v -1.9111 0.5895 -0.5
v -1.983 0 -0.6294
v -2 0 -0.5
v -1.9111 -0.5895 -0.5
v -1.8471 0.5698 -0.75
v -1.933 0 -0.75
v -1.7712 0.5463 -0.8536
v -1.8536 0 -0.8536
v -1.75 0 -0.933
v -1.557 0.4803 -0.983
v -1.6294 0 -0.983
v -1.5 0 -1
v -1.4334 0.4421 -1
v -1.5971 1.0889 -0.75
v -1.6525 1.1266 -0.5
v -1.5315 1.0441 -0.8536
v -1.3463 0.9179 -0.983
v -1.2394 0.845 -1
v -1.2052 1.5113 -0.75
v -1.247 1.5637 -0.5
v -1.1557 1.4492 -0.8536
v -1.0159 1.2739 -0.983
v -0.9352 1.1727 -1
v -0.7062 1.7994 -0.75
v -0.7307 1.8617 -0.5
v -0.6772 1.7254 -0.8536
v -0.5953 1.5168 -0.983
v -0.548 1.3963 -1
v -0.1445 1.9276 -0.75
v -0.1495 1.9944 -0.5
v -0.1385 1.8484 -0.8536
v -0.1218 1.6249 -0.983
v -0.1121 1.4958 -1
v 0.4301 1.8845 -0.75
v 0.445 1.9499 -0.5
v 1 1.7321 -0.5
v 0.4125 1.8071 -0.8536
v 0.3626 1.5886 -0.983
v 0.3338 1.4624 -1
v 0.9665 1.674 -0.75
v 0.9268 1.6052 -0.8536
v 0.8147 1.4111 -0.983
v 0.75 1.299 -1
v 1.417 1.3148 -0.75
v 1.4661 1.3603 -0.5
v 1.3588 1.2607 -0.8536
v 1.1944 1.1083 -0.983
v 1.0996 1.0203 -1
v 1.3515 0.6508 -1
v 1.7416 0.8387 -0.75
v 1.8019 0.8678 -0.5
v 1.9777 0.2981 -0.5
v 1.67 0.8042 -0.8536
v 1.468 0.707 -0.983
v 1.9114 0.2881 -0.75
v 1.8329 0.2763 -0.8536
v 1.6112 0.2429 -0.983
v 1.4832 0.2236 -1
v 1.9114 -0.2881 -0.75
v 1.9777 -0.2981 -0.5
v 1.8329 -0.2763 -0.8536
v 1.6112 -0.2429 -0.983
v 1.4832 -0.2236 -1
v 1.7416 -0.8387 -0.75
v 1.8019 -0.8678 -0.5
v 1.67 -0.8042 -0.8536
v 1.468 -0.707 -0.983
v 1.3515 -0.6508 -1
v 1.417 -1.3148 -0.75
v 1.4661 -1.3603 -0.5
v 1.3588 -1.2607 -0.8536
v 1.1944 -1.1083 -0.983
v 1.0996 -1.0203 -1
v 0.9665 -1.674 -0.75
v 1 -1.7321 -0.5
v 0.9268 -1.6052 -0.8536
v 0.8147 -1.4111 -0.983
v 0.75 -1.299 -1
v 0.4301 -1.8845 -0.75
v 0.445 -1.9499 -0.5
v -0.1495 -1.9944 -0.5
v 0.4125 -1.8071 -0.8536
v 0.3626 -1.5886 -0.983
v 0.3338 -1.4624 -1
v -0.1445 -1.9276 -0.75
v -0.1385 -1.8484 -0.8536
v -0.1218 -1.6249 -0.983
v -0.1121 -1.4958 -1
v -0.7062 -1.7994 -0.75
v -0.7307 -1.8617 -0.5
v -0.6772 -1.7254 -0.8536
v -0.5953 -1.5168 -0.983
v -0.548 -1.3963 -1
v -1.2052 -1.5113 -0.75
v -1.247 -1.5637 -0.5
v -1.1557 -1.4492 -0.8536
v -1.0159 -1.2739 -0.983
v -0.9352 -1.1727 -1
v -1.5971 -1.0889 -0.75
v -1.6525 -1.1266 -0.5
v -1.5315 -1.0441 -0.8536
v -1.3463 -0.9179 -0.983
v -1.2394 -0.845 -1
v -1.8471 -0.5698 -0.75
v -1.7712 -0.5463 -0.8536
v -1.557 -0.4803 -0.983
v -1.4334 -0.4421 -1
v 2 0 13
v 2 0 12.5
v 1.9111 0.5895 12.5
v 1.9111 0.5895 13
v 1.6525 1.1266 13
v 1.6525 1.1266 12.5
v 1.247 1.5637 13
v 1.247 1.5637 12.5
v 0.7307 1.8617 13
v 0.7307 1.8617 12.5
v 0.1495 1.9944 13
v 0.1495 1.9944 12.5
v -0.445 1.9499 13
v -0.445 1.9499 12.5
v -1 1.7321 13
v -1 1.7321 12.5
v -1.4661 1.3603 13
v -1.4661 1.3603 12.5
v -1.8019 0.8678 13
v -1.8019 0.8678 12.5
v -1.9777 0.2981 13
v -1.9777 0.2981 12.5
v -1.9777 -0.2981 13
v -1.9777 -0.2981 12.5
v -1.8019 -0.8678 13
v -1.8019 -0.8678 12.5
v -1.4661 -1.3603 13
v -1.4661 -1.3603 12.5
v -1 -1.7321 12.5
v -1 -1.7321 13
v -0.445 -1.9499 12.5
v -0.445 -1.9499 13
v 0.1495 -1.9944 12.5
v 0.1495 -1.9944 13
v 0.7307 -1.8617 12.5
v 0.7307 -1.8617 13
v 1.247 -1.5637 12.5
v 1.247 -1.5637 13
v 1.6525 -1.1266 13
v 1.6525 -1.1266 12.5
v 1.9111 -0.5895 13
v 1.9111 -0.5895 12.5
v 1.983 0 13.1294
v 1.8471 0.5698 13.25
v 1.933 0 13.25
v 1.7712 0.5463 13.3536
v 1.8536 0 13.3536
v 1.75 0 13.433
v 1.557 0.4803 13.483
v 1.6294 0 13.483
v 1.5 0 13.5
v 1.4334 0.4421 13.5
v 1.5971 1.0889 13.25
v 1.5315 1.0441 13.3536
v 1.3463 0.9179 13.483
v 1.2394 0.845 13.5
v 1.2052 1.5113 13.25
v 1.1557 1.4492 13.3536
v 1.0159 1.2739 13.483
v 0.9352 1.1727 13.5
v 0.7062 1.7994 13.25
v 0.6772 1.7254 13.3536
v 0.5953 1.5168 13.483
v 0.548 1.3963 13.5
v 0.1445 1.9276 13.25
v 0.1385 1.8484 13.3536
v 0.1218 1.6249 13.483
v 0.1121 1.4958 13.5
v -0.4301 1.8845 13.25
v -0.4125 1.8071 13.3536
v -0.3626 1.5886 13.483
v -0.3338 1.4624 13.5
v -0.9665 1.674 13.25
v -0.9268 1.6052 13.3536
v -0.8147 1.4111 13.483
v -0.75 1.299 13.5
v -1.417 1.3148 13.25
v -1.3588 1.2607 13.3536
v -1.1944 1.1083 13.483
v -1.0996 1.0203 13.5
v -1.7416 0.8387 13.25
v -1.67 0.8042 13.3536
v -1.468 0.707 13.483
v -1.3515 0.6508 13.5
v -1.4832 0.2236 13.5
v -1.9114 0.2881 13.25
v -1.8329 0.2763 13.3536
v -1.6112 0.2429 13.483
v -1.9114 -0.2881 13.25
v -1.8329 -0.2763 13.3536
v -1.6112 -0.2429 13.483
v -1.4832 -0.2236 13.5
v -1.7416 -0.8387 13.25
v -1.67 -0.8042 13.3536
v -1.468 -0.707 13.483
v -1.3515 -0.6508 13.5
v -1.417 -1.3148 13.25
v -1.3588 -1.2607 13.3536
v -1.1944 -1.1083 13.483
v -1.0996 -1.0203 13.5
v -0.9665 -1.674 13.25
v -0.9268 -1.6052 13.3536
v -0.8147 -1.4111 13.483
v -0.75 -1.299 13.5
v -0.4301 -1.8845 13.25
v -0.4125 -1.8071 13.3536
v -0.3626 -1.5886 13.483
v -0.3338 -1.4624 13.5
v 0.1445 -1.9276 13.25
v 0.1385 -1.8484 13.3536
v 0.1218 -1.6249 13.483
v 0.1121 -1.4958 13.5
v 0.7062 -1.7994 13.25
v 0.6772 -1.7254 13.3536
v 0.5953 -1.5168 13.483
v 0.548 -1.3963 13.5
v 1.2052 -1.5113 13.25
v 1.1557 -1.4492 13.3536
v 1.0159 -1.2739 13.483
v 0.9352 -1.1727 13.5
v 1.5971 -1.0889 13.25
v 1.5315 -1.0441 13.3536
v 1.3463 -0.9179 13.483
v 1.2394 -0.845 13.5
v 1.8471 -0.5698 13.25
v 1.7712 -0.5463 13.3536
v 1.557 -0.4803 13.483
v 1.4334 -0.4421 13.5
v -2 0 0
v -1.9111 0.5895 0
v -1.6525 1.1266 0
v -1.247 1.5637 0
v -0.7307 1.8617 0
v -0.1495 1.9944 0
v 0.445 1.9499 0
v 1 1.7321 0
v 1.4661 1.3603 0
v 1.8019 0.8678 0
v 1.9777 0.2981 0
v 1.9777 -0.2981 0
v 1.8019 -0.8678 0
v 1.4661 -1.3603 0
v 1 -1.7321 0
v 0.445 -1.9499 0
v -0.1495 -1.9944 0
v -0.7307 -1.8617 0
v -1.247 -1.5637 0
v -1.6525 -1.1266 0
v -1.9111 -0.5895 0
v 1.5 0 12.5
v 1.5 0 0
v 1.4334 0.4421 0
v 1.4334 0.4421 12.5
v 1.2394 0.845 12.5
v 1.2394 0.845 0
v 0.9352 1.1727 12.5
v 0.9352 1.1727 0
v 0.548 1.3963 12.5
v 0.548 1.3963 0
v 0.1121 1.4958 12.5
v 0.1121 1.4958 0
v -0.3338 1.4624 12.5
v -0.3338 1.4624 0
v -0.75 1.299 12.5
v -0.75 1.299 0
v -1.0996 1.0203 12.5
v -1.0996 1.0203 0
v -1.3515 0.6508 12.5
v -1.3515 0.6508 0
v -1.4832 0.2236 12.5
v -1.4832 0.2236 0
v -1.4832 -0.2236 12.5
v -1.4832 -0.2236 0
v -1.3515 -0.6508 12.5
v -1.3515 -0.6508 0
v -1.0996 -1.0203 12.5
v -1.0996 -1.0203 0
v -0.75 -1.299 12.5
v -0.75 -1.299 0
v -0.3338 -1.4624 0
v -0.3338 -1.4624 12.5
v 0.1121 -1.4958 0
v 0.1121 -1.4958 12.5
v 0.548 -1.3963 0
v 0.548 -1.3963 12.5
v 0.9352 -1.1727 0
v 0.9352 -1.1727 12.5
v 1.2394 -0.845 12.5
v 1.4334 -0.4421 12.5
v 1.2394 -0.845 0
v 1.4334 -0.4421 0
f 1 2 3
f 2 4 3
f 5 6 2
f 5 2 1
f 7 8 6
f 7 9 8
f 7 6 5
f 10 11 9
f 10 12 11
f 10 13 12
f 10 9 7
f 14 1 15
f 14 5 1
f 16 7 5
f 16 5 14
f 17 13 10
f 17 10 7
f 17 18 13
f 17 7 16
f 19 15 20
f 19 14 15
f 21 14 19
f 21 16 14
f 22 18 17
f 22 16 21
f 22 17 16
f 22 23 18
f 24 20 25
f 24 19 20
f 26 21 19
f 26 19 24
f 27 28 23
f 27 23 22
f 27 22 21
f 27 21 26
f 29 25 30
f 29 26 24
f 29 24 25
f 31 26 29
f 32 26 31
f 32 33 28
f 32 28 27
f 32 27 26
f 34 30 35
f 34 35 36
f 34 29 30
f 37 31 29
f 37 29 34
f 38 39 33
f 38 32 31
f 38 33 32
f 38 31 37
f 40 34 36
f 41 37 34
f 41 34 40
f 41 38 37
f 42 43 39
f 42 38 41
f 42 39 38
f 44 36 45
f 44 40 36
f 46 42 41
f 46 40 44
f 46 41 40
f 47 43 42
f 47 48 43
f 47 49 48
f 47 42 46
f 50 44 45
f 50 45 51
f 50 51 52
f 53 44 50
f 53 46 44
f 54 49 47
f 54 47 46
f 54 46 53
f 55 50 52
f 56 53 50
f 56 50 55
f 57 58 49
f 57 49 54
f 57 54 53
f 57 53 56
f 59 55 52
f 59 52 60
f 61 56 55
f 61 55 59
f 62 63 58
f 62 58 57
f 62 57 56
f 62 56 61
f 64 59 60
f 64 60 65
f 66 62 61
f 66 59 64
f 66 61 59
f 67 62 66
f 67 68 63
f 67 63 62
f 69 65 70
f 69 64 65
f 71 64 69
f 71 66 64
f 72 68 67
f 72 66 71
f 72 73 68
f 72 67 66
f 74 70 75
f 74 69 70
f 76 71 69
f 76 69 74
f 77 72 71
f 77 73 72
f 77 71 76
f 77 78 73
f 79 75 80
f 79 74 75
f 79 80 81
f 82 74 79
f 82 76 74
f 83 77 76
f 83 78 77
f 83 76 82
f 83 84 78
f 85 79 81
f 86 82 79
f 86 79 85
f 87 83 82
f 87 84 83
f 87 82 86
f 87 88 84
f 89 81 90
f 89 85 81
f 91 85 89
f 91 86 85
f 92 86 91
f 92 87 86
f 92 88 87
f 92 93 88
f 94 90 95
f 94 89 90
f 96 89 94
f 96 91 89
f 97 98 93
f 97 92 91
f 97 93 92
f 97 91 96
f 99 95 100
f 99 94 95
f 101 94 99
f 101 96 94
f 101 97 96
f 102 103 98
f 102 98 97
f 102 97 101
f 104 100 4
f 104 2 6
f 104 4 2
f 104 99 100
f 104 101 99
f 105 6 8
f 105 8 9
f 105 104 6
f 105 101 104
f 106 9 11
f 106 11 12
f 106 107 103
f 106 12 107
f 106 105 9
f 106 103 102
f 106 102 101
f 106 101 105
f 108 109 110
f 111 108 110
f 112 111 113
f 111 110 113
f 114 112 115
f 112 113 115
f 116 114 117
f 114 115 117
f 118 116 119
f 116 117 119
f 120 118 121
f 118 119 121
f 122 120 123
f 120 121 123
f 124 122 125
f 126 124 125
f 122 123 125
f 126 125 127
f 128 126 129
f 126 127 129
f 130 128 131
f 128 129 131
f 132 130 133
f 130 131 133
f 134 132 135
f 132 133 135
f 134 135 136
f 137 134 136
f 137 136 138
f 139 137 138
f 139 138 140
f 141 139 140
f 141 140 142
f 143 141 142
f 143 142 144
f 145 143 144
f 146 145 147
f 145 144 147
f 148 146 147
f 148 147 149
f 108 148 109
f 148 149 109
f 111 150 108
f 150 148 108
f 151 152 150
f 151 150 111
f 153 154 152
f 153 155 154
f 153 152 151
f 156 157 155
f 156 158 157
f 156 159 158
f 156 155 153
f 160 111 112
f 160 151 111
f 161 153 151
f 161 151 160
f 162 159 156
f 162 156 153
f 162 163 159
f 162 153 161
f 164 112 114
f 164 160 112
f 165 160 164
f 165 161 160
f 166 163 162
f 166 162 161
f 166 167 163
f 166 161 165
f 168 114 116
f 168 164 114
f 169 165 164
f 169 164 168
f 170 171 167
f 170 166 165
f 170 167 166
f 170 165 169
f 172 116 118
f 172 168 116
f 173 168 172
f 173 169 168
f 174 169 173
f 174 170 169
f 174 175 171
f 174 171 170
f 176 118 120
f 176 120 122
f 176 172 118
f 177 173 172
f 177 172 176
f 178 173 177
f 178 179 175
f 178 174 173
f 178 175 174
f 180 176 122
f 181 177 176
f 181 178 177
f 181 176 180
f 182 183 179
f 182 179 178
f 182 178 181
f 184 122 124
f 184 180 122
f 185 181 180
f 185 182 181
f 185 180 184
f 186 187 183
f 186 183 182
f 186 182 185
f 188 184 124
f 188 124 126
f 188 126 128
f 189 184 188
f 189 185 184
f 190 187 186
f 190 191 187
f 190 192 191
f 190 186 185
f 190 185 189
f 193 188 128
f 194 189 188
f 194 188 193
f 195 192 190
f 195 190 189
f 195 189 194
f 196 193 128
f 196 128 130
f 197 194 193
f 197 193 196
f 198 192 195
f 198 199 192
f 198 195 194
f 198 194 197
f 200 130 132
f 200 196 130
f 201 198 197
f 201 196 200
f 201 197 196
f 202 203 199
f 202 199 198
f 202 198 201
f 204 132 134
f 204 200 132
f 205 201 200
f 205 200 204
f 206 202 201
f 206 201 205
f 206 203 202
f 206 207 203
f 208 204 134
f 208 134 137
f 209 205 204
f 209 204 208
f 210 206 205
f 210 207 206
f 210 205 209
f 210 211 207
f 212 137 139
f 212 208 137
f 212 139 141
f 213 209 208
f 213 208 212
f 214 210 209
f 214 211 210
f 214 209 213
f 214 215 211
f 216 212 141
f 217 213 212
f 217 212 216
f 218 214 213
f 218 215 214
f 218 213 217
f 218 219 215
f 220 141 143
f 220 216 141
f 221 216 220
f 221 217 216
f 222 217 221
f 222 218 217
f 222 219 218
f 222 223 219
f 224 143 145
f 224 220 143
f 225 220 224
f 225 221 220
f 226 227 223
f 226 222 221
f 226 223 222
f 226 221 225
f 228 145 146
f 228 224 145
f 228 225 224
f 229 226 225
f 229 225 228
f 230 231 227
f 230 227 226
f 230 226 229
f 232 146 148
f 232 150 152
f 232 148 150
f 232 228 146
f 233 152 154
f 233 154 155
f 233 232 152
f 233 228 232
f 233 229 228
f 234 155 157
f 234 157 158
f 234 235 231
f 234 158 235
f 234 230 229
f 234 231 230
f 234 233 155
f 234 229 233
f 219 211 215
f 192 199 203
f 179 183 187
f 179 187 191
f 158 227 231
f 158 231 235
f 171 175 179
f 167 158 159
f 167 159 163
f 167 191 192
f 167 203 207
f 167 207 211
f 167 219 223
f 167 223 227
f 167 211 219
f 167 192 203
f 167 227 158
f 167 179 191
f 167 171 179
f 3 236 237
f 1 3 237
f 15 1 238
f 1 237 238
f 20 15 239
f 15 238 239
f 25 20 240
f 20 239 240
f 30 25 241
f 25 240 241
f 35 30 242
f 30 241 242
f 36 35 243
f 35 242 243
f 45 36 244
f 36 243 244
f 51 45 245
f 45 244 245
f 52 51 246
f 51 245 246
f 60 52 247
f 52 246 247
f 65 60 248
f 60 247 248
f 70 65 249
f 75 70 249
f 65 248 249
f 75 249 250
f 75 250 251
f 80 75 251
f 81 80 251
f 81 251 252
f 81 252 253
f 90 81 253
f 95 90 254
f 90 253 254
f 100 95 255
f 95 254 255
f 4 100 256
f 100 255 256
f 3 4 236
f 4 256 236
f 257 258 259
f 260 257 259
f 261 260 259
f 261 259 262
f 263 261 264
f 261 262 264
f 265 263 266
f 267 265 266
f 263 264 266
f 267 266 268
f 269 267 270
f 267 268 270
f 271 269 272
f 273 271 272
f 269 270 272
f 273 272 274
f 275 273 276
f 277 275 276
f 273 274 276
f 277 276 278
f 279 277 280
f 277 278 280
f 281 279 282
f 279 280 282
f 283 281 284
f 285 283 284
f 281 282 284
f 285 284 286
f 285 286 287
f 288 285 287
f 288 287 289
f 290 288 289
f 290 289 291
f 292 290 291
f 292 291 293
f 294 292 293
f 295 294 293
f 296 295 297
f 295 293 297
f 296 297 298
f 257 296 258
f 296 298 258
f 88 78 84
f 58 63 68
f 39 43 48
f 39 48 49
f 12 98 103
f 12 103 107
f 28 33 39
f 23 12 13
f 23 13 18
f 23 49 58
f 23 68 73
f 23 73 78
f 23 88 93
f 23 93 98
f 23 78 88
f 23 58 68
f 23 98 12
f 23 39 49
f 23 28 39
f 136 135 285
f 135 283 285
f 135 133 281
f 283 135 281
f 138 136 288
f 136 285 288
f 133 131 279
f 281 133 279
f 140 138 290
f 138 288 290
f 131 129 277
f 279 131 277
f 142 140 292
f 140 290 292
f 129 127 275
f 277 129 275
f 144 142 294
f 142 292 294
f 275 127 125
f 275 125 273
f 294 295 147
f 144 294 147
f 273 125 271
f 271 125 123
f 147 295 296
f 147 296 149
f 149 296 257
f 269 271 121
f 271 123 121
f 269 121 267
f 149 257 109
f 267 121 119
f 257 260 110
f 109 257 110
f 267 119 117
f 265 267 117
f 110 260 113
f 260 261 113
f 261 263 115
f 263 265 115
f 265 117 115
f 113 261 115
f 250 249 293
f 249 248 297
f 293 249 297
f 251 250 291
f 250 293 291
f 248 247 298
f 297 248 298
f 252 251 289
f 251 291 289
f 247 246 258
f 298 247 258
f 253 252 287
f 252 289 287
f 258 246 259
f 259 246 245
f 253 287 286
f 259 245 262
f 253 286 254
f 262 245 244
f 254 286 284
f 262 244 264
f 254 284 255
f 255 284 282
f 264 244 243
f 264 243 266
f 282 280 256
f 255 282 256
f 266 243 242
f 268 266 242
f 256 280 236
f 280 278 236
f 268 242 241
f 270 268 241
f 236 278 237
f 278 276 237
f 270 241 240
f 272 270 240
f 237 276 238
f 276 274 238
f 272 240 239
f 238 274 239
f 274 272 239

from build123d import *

# Parameters (mm, degrees)
SKETCH1_R           = 1.5
BOSS_EXTRUDE1_DEPTH = 12.5
SKETCH2_R           = 2
BOSS_EXTRUDE2_DEPTH = 1
SKETCH3_R           = 2
BOSS_EXTRUDE3_DEPTH = 1
FILLET1_R           = 0.5


with BuildPart() as part:
    # Sketch1 → Boss-Extrude1 (new body)
    with BuildSketch(Plane.XY):
        Circle(SKETCH1_R)
    extrude(amount=BOSS_EXTRUDE1_DEPTH)

    # Sketch2 → Boss-Extrude2 (add)
    with BuildSketch(Plane(origin=(0, 0, 0), x_dir=(-1, 0, 0), z_dir=(0, 0, -1))):
        Circle(SKETCH2_R)
    extrude(amount=BOSS_EXTRUDE2_DEPTH)

    # Sketch3 → Boss-Extrude3 (add)
    with BuildSketch(Plane.XY.offset(12.5)):
        Circle(SKETCH3_R)
    extrude(amount=BOSS_EXTRUDE3_DEPTH)

    # Fillet1
    fillet1_edges = [part.edges().sort_by_distance(p)[0] for p in [
        (-2, 0, 13.5),
        (2, 0, -1),
    ]]
    fillet(fillet1_edges, radius=FILLET1_R)


solid = part.part
